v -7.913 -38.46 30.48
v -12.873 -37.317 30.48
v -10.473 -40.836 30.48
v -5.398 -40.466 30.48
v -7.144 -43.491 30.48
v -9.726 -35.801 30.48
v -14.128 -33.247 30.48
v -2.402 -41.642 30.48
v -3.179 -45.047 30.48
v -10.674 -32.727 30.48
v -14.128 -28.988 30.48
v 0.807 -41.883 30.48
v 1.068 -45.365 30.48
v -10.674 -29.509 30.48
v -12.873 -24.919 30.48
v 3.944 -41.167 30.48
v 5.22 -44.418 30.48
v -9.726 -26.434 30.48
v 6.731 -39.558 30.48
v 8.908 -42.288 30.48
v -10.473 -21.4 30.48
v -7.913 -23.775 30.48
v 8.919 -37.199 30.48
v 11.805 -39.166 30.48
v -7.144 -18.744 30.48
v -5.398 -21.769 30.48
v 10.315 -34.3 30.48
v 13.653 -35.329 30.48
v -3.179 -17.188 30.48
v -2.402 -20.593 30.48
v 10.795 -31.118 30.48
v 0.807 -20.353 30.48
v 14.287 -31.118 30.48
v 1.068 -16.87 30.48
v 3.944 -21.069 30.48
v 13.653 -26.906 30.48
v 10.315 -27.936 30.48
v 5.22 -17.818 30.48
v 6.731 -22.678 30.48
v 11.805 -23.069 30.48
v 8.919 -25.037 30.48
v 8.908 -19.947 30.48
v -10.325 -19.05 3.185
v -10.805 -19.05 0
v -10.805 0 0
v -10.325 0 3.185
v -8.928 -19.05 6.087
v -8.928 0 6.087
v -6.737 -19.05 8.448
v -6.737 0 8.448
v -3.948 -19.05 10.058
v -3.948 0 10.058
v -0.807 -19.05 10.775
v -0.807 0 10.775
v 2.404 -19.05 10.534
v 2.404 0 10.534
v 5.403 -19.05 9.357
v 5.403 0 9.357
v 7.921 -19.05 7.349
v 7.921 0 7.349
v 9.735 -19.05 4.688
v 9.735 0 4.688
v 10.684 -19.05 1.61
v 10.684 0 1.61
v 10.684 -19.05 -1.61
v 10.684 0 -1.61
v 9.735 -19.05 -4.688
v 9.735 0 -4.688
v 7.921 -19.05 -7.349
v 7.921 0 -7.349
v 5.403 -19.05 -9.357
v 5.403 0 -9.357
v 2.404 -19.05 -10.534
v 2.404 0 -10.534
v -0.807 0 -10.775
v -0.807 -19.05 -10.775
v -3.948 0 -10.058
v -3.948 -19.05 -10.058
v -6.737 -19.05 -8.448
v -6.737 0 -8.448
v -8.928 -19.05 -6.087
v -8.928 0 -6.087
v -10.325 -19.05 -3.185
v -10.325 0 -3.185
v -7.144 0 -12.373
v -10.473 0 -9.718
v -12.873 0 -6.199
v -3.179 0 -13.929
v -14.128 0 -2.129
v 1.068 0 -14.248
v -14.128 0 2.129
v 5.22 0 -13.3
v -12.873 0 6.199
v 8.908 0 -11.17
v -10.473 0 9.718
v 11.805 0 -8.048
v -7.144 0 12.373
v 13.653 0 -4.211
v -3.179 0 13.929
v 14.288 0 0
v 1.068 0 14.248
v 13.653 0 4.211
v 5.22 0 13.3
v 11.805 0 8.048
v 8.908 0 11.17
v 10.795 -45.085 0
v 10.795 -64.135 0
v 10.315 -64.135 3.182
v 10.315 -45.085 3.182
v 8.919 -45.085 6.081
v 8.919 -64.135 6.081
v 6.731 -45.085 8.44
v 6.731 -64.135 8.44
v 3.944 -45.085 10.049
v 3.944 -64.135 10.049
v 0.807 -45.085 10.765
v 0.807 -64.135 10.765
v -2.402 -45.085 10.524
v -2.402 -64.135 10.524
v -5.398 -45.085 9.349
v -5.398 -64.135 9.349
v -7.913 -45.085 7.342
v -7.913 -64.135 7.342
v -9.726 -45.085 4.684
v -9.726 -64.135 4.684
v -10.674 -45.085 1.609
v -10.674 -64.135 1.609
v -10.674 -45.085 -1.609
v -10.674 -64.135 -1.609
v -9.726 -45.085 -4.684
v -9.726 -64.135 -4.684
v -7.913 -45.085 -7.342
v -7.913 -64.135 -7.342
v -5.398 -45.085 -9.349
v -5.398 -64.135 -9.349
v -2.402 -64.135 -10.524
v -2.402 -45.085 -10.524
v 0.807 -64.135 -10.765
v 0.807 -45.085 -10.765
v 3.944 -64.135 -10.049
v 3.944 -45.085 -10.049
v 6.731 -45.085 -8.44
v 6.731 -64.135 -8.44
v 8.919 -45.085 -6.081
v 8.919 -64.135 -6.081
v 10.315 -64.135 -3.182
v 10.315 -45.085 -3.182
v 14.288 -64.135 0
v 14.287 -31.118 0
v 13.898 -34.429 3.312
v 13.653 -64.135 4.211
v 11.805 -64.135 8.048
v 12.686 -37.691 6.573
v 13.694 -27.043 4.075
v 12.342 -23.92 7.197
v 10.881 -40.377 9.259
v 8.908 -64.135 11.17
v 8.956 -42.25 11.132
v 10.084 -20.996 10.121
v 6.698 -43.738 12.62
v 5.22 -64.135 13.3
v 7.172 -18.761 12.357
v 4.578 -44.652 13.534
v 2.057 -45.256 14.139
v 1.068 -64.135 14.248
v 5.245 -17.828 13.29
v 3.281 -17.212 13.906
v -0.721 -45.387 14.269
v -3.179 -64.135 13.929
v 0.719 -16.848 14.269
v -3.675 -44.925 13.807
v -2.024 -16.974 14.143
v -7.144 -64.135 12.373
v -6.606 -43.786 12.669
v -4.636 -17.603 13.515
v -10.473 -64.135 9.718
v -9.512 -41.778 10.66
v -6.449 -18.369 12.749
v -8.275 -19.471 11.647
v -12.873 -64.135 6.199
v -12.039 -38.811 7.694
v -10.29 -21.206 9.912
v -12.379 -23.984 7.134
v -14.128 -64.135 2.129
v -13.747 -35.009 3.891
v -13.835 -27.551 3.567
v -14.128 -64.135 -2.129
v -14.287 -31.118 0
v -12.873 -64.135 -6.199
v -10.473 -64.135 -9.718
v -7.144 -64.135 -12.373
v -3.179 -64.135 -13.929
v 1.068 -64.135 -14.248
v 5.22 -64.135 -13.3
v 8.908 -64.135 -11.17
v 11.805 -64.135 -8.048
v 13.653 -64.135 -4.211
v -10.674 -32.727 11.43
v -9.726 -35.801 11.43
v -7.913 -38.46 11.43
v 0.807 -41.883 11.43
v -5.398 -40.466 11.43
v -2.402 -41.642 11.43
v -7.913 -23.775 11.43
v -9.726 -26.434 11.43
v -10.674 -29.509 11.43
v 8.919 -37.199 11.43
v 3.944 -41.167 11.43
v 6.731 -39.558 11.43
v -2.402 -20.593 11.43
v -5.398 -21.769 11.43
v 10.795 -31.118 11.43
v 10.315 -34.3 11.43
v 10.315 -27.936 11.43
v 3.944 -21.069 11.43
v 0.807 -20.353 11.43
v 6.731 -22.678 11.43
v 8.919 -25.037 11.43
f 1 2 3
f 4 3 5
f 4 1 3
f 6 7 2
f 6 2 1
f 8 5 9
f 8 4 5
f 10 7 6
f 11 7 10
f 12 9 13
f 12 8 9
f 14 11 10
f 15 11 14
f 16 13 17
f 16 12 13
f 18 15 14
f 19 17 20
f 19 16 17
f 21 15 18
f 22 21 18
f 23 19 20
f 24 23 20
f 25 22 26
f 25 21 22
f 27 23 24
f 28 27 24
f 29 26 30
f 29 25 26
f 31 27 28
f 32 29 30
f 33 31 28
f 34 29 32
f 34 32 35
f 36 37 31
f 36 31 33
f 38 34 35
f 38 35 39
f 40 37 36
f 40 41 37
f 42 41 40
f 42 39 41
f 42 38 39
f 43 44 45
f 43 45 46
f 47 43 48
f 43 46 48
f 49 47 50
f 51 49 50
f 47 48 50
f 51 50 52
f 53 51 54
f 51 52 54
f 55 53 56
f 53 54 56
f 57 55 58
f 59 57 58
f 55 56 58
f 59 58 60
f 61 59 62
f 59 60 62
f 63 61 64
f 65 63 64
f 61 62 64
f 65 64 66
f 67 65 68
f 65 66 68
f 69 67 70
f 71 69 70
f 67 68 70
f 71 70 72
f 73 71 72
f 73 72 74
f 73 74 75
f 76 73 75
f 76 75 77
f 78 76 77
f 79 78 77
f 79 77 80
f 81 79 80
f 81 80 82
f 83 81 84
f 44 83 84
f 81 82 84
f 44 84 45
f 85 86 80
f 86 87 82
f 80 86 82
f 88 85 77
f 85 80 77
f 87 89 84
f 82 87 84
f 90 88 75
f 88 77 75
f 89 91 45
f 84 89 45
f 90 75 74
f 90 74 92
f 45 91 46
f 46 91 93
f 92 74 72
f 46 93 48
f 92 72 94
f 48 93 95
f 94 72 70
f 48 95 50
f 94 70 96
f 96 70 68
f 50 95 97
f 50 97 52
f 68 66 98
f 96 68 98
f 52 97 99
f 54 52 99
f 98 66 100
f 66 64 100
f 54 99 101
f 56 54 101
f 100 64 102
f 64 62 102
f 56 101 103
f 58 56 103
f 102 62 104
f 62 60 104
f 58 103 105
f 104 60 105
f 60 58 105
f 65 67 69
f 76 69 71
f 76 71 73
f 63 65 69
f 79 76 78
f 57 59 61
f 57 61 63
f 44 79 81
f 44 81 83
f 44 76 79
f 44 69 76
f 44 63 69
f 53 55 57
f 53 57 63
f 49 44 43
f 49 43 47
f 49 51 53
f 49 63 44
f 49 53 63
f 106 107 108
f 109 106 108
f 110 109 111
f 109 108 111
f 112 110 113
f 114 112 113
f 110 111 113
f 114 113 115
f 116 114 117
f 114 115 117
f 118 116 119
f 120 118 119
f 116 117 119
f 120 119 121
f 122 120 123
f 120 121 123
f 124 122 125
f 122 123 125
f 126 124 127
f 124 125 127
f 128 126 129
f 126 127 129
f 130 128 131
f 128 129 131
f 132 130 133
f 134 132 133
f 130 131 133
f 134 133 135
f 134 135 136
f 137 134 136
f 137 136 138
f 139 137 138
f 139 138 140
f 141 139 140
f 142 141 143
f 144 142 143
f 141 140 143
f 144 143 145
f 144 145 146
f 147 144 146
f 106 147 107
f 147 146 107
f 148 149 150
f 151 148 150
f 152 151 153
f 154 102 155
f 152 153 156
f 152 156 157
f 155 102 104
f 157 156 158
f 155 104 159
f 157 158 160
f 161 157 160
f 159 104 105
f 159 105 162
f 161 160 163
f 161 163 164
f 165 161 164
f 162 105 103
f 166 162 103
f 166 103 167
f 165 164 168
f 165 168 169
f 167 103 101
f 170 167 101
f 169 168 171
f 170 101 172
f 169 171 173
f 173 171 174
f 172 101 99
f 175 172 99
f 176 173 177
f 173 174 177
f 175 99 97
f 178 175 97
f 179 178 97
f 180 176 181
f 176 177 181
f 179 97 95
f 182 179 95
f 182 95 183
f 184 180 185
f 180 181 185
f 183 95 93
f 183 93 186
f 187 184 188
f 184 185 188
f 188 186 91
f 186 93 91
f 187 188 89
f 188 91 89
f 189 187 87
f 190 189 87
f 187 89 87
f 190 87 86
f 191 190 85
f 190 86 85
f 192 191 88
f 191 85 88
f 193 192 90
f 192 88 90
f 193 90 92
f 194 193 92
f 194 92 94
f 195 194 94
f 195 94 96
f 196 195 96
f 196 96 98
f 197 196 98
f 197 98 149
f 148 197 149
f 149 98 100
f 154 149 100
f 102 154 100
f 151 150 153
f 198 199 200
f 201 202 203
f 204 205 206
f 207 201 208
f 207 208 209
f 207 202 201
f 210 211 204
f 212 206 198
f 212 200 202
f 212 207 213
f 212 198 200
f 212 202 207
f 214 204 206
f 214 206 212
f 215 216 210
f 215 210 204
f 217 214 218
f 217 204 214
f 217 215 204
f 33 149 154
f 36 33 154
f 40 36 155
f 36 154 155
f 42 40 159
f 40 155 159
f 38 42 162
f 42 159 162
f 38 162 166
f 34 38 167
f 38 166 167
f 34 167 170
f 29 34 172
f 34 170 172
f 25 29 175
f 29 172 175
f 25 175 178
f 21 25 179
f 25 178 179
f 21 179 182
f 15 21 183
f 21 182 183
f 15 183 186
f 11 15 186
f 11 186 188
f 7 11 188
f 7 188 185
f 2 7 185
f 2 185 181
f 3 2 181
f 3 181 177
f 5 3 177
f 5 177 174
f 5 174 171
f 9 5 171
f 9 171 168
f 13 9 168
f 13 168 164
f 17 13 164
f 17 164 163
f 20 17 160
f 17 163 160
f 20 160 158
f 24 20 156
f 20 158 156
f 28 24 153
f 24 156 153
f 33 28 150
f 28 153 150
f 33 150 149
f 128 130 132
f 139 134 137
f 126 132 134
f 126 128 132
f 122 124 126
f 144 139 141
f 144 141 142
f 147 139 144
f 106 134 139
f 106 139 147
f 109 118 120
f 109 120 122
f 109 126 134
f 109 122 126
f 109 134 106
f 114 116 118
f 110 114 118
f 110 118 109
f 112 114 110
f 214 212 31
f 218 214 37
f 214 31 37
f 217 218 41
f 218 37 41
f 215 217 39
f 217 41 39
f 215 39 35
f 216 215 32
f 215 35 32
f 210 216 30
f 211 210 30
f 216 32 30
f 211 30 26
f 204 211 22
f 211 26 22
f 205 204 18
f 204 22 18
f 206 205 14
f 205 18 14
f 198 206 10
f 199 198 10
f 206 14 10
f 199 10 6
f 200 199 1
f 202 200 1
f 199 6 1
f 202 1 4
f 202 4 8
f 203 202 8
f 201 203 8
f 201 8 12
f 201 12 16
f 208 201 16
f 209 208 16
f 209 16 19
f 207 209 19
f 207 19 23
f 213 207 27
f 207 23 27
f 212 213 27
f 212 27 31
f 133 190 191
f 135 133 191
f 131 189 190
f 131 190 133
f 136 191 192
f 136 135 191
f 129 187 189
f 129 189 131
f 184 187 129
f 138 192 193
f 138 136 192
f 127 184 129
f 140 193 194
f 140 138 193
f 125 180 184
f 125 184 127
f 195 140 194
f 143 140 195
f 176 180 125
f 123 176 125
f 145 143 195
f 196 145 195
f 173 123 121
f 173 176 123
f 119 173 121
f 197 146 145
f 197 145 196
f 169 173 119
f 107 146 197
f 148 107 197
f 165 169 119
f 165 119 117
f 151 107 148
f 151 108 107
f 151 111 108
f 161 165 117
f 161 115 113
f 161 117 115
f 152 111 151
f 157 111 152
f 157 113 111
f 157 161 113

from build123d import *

# Parameters (mm, degrees)
F0_R     = 14.2875
F1_DEPTH = 64.135
F4_DEPTH = 30.48
F6_R     = 10.8050815028
F7_DEPTH = 19.05
F5_R     = 10.795
F8_DEPTH = 19.05
F2_R     = 10.795
F9_DEPTH = 19.05


with BuildPart() as f1:
    # F0 (on Front) → F1 (new body)
    with BuildSketch(Plane.XZ):
        Circle(F0_R)
    extrude(amount=F1_DEPTH)

    # F3 (on Top) → F4 (join)
    with BuildSketch(Plane.XY):
        with BuildLine():
            ThreePointArc((0, -45.4052215051), (10.1027881362, -41.2205096413), (14.2875, -31.1177215051))
            ThreePointArc((14.2875, -31.1177215051), (-10.1027881362, -21.0149333689), (0, -45.4052215051))
        make_face()
    extrude(amount=F4_DEPTH)

    # F6 (on face) → F7 (cut)
    with BuildSketch(Plane(origin=(0, 0, 0), x_dir=(-1, 0, 0), z_dir=(0, 1, 0))):
        Circle(F6_R)
    extrude(amount=-F7_DEPTH, mode=Mode.SUBTRACT)

    # F5 (on face) → F8 (cut)
    with BuildSketch(Plane.XY.offset(30.48)):
        with Locations((0, -31.1177215051)):
            Circle(F5_R)
    extrude(amount=-F8_DEPTH, mode=Mode.SUBTRACT)

    # F2 (on face) → F9 (cut)
    with BuildSketch(Plane.XZ.offset(64.135)):
        Circle(F2_R)
    extrude(amount=-F9_DEPTH, mode=Mode.SUBTRACT)


solid = f1.part
